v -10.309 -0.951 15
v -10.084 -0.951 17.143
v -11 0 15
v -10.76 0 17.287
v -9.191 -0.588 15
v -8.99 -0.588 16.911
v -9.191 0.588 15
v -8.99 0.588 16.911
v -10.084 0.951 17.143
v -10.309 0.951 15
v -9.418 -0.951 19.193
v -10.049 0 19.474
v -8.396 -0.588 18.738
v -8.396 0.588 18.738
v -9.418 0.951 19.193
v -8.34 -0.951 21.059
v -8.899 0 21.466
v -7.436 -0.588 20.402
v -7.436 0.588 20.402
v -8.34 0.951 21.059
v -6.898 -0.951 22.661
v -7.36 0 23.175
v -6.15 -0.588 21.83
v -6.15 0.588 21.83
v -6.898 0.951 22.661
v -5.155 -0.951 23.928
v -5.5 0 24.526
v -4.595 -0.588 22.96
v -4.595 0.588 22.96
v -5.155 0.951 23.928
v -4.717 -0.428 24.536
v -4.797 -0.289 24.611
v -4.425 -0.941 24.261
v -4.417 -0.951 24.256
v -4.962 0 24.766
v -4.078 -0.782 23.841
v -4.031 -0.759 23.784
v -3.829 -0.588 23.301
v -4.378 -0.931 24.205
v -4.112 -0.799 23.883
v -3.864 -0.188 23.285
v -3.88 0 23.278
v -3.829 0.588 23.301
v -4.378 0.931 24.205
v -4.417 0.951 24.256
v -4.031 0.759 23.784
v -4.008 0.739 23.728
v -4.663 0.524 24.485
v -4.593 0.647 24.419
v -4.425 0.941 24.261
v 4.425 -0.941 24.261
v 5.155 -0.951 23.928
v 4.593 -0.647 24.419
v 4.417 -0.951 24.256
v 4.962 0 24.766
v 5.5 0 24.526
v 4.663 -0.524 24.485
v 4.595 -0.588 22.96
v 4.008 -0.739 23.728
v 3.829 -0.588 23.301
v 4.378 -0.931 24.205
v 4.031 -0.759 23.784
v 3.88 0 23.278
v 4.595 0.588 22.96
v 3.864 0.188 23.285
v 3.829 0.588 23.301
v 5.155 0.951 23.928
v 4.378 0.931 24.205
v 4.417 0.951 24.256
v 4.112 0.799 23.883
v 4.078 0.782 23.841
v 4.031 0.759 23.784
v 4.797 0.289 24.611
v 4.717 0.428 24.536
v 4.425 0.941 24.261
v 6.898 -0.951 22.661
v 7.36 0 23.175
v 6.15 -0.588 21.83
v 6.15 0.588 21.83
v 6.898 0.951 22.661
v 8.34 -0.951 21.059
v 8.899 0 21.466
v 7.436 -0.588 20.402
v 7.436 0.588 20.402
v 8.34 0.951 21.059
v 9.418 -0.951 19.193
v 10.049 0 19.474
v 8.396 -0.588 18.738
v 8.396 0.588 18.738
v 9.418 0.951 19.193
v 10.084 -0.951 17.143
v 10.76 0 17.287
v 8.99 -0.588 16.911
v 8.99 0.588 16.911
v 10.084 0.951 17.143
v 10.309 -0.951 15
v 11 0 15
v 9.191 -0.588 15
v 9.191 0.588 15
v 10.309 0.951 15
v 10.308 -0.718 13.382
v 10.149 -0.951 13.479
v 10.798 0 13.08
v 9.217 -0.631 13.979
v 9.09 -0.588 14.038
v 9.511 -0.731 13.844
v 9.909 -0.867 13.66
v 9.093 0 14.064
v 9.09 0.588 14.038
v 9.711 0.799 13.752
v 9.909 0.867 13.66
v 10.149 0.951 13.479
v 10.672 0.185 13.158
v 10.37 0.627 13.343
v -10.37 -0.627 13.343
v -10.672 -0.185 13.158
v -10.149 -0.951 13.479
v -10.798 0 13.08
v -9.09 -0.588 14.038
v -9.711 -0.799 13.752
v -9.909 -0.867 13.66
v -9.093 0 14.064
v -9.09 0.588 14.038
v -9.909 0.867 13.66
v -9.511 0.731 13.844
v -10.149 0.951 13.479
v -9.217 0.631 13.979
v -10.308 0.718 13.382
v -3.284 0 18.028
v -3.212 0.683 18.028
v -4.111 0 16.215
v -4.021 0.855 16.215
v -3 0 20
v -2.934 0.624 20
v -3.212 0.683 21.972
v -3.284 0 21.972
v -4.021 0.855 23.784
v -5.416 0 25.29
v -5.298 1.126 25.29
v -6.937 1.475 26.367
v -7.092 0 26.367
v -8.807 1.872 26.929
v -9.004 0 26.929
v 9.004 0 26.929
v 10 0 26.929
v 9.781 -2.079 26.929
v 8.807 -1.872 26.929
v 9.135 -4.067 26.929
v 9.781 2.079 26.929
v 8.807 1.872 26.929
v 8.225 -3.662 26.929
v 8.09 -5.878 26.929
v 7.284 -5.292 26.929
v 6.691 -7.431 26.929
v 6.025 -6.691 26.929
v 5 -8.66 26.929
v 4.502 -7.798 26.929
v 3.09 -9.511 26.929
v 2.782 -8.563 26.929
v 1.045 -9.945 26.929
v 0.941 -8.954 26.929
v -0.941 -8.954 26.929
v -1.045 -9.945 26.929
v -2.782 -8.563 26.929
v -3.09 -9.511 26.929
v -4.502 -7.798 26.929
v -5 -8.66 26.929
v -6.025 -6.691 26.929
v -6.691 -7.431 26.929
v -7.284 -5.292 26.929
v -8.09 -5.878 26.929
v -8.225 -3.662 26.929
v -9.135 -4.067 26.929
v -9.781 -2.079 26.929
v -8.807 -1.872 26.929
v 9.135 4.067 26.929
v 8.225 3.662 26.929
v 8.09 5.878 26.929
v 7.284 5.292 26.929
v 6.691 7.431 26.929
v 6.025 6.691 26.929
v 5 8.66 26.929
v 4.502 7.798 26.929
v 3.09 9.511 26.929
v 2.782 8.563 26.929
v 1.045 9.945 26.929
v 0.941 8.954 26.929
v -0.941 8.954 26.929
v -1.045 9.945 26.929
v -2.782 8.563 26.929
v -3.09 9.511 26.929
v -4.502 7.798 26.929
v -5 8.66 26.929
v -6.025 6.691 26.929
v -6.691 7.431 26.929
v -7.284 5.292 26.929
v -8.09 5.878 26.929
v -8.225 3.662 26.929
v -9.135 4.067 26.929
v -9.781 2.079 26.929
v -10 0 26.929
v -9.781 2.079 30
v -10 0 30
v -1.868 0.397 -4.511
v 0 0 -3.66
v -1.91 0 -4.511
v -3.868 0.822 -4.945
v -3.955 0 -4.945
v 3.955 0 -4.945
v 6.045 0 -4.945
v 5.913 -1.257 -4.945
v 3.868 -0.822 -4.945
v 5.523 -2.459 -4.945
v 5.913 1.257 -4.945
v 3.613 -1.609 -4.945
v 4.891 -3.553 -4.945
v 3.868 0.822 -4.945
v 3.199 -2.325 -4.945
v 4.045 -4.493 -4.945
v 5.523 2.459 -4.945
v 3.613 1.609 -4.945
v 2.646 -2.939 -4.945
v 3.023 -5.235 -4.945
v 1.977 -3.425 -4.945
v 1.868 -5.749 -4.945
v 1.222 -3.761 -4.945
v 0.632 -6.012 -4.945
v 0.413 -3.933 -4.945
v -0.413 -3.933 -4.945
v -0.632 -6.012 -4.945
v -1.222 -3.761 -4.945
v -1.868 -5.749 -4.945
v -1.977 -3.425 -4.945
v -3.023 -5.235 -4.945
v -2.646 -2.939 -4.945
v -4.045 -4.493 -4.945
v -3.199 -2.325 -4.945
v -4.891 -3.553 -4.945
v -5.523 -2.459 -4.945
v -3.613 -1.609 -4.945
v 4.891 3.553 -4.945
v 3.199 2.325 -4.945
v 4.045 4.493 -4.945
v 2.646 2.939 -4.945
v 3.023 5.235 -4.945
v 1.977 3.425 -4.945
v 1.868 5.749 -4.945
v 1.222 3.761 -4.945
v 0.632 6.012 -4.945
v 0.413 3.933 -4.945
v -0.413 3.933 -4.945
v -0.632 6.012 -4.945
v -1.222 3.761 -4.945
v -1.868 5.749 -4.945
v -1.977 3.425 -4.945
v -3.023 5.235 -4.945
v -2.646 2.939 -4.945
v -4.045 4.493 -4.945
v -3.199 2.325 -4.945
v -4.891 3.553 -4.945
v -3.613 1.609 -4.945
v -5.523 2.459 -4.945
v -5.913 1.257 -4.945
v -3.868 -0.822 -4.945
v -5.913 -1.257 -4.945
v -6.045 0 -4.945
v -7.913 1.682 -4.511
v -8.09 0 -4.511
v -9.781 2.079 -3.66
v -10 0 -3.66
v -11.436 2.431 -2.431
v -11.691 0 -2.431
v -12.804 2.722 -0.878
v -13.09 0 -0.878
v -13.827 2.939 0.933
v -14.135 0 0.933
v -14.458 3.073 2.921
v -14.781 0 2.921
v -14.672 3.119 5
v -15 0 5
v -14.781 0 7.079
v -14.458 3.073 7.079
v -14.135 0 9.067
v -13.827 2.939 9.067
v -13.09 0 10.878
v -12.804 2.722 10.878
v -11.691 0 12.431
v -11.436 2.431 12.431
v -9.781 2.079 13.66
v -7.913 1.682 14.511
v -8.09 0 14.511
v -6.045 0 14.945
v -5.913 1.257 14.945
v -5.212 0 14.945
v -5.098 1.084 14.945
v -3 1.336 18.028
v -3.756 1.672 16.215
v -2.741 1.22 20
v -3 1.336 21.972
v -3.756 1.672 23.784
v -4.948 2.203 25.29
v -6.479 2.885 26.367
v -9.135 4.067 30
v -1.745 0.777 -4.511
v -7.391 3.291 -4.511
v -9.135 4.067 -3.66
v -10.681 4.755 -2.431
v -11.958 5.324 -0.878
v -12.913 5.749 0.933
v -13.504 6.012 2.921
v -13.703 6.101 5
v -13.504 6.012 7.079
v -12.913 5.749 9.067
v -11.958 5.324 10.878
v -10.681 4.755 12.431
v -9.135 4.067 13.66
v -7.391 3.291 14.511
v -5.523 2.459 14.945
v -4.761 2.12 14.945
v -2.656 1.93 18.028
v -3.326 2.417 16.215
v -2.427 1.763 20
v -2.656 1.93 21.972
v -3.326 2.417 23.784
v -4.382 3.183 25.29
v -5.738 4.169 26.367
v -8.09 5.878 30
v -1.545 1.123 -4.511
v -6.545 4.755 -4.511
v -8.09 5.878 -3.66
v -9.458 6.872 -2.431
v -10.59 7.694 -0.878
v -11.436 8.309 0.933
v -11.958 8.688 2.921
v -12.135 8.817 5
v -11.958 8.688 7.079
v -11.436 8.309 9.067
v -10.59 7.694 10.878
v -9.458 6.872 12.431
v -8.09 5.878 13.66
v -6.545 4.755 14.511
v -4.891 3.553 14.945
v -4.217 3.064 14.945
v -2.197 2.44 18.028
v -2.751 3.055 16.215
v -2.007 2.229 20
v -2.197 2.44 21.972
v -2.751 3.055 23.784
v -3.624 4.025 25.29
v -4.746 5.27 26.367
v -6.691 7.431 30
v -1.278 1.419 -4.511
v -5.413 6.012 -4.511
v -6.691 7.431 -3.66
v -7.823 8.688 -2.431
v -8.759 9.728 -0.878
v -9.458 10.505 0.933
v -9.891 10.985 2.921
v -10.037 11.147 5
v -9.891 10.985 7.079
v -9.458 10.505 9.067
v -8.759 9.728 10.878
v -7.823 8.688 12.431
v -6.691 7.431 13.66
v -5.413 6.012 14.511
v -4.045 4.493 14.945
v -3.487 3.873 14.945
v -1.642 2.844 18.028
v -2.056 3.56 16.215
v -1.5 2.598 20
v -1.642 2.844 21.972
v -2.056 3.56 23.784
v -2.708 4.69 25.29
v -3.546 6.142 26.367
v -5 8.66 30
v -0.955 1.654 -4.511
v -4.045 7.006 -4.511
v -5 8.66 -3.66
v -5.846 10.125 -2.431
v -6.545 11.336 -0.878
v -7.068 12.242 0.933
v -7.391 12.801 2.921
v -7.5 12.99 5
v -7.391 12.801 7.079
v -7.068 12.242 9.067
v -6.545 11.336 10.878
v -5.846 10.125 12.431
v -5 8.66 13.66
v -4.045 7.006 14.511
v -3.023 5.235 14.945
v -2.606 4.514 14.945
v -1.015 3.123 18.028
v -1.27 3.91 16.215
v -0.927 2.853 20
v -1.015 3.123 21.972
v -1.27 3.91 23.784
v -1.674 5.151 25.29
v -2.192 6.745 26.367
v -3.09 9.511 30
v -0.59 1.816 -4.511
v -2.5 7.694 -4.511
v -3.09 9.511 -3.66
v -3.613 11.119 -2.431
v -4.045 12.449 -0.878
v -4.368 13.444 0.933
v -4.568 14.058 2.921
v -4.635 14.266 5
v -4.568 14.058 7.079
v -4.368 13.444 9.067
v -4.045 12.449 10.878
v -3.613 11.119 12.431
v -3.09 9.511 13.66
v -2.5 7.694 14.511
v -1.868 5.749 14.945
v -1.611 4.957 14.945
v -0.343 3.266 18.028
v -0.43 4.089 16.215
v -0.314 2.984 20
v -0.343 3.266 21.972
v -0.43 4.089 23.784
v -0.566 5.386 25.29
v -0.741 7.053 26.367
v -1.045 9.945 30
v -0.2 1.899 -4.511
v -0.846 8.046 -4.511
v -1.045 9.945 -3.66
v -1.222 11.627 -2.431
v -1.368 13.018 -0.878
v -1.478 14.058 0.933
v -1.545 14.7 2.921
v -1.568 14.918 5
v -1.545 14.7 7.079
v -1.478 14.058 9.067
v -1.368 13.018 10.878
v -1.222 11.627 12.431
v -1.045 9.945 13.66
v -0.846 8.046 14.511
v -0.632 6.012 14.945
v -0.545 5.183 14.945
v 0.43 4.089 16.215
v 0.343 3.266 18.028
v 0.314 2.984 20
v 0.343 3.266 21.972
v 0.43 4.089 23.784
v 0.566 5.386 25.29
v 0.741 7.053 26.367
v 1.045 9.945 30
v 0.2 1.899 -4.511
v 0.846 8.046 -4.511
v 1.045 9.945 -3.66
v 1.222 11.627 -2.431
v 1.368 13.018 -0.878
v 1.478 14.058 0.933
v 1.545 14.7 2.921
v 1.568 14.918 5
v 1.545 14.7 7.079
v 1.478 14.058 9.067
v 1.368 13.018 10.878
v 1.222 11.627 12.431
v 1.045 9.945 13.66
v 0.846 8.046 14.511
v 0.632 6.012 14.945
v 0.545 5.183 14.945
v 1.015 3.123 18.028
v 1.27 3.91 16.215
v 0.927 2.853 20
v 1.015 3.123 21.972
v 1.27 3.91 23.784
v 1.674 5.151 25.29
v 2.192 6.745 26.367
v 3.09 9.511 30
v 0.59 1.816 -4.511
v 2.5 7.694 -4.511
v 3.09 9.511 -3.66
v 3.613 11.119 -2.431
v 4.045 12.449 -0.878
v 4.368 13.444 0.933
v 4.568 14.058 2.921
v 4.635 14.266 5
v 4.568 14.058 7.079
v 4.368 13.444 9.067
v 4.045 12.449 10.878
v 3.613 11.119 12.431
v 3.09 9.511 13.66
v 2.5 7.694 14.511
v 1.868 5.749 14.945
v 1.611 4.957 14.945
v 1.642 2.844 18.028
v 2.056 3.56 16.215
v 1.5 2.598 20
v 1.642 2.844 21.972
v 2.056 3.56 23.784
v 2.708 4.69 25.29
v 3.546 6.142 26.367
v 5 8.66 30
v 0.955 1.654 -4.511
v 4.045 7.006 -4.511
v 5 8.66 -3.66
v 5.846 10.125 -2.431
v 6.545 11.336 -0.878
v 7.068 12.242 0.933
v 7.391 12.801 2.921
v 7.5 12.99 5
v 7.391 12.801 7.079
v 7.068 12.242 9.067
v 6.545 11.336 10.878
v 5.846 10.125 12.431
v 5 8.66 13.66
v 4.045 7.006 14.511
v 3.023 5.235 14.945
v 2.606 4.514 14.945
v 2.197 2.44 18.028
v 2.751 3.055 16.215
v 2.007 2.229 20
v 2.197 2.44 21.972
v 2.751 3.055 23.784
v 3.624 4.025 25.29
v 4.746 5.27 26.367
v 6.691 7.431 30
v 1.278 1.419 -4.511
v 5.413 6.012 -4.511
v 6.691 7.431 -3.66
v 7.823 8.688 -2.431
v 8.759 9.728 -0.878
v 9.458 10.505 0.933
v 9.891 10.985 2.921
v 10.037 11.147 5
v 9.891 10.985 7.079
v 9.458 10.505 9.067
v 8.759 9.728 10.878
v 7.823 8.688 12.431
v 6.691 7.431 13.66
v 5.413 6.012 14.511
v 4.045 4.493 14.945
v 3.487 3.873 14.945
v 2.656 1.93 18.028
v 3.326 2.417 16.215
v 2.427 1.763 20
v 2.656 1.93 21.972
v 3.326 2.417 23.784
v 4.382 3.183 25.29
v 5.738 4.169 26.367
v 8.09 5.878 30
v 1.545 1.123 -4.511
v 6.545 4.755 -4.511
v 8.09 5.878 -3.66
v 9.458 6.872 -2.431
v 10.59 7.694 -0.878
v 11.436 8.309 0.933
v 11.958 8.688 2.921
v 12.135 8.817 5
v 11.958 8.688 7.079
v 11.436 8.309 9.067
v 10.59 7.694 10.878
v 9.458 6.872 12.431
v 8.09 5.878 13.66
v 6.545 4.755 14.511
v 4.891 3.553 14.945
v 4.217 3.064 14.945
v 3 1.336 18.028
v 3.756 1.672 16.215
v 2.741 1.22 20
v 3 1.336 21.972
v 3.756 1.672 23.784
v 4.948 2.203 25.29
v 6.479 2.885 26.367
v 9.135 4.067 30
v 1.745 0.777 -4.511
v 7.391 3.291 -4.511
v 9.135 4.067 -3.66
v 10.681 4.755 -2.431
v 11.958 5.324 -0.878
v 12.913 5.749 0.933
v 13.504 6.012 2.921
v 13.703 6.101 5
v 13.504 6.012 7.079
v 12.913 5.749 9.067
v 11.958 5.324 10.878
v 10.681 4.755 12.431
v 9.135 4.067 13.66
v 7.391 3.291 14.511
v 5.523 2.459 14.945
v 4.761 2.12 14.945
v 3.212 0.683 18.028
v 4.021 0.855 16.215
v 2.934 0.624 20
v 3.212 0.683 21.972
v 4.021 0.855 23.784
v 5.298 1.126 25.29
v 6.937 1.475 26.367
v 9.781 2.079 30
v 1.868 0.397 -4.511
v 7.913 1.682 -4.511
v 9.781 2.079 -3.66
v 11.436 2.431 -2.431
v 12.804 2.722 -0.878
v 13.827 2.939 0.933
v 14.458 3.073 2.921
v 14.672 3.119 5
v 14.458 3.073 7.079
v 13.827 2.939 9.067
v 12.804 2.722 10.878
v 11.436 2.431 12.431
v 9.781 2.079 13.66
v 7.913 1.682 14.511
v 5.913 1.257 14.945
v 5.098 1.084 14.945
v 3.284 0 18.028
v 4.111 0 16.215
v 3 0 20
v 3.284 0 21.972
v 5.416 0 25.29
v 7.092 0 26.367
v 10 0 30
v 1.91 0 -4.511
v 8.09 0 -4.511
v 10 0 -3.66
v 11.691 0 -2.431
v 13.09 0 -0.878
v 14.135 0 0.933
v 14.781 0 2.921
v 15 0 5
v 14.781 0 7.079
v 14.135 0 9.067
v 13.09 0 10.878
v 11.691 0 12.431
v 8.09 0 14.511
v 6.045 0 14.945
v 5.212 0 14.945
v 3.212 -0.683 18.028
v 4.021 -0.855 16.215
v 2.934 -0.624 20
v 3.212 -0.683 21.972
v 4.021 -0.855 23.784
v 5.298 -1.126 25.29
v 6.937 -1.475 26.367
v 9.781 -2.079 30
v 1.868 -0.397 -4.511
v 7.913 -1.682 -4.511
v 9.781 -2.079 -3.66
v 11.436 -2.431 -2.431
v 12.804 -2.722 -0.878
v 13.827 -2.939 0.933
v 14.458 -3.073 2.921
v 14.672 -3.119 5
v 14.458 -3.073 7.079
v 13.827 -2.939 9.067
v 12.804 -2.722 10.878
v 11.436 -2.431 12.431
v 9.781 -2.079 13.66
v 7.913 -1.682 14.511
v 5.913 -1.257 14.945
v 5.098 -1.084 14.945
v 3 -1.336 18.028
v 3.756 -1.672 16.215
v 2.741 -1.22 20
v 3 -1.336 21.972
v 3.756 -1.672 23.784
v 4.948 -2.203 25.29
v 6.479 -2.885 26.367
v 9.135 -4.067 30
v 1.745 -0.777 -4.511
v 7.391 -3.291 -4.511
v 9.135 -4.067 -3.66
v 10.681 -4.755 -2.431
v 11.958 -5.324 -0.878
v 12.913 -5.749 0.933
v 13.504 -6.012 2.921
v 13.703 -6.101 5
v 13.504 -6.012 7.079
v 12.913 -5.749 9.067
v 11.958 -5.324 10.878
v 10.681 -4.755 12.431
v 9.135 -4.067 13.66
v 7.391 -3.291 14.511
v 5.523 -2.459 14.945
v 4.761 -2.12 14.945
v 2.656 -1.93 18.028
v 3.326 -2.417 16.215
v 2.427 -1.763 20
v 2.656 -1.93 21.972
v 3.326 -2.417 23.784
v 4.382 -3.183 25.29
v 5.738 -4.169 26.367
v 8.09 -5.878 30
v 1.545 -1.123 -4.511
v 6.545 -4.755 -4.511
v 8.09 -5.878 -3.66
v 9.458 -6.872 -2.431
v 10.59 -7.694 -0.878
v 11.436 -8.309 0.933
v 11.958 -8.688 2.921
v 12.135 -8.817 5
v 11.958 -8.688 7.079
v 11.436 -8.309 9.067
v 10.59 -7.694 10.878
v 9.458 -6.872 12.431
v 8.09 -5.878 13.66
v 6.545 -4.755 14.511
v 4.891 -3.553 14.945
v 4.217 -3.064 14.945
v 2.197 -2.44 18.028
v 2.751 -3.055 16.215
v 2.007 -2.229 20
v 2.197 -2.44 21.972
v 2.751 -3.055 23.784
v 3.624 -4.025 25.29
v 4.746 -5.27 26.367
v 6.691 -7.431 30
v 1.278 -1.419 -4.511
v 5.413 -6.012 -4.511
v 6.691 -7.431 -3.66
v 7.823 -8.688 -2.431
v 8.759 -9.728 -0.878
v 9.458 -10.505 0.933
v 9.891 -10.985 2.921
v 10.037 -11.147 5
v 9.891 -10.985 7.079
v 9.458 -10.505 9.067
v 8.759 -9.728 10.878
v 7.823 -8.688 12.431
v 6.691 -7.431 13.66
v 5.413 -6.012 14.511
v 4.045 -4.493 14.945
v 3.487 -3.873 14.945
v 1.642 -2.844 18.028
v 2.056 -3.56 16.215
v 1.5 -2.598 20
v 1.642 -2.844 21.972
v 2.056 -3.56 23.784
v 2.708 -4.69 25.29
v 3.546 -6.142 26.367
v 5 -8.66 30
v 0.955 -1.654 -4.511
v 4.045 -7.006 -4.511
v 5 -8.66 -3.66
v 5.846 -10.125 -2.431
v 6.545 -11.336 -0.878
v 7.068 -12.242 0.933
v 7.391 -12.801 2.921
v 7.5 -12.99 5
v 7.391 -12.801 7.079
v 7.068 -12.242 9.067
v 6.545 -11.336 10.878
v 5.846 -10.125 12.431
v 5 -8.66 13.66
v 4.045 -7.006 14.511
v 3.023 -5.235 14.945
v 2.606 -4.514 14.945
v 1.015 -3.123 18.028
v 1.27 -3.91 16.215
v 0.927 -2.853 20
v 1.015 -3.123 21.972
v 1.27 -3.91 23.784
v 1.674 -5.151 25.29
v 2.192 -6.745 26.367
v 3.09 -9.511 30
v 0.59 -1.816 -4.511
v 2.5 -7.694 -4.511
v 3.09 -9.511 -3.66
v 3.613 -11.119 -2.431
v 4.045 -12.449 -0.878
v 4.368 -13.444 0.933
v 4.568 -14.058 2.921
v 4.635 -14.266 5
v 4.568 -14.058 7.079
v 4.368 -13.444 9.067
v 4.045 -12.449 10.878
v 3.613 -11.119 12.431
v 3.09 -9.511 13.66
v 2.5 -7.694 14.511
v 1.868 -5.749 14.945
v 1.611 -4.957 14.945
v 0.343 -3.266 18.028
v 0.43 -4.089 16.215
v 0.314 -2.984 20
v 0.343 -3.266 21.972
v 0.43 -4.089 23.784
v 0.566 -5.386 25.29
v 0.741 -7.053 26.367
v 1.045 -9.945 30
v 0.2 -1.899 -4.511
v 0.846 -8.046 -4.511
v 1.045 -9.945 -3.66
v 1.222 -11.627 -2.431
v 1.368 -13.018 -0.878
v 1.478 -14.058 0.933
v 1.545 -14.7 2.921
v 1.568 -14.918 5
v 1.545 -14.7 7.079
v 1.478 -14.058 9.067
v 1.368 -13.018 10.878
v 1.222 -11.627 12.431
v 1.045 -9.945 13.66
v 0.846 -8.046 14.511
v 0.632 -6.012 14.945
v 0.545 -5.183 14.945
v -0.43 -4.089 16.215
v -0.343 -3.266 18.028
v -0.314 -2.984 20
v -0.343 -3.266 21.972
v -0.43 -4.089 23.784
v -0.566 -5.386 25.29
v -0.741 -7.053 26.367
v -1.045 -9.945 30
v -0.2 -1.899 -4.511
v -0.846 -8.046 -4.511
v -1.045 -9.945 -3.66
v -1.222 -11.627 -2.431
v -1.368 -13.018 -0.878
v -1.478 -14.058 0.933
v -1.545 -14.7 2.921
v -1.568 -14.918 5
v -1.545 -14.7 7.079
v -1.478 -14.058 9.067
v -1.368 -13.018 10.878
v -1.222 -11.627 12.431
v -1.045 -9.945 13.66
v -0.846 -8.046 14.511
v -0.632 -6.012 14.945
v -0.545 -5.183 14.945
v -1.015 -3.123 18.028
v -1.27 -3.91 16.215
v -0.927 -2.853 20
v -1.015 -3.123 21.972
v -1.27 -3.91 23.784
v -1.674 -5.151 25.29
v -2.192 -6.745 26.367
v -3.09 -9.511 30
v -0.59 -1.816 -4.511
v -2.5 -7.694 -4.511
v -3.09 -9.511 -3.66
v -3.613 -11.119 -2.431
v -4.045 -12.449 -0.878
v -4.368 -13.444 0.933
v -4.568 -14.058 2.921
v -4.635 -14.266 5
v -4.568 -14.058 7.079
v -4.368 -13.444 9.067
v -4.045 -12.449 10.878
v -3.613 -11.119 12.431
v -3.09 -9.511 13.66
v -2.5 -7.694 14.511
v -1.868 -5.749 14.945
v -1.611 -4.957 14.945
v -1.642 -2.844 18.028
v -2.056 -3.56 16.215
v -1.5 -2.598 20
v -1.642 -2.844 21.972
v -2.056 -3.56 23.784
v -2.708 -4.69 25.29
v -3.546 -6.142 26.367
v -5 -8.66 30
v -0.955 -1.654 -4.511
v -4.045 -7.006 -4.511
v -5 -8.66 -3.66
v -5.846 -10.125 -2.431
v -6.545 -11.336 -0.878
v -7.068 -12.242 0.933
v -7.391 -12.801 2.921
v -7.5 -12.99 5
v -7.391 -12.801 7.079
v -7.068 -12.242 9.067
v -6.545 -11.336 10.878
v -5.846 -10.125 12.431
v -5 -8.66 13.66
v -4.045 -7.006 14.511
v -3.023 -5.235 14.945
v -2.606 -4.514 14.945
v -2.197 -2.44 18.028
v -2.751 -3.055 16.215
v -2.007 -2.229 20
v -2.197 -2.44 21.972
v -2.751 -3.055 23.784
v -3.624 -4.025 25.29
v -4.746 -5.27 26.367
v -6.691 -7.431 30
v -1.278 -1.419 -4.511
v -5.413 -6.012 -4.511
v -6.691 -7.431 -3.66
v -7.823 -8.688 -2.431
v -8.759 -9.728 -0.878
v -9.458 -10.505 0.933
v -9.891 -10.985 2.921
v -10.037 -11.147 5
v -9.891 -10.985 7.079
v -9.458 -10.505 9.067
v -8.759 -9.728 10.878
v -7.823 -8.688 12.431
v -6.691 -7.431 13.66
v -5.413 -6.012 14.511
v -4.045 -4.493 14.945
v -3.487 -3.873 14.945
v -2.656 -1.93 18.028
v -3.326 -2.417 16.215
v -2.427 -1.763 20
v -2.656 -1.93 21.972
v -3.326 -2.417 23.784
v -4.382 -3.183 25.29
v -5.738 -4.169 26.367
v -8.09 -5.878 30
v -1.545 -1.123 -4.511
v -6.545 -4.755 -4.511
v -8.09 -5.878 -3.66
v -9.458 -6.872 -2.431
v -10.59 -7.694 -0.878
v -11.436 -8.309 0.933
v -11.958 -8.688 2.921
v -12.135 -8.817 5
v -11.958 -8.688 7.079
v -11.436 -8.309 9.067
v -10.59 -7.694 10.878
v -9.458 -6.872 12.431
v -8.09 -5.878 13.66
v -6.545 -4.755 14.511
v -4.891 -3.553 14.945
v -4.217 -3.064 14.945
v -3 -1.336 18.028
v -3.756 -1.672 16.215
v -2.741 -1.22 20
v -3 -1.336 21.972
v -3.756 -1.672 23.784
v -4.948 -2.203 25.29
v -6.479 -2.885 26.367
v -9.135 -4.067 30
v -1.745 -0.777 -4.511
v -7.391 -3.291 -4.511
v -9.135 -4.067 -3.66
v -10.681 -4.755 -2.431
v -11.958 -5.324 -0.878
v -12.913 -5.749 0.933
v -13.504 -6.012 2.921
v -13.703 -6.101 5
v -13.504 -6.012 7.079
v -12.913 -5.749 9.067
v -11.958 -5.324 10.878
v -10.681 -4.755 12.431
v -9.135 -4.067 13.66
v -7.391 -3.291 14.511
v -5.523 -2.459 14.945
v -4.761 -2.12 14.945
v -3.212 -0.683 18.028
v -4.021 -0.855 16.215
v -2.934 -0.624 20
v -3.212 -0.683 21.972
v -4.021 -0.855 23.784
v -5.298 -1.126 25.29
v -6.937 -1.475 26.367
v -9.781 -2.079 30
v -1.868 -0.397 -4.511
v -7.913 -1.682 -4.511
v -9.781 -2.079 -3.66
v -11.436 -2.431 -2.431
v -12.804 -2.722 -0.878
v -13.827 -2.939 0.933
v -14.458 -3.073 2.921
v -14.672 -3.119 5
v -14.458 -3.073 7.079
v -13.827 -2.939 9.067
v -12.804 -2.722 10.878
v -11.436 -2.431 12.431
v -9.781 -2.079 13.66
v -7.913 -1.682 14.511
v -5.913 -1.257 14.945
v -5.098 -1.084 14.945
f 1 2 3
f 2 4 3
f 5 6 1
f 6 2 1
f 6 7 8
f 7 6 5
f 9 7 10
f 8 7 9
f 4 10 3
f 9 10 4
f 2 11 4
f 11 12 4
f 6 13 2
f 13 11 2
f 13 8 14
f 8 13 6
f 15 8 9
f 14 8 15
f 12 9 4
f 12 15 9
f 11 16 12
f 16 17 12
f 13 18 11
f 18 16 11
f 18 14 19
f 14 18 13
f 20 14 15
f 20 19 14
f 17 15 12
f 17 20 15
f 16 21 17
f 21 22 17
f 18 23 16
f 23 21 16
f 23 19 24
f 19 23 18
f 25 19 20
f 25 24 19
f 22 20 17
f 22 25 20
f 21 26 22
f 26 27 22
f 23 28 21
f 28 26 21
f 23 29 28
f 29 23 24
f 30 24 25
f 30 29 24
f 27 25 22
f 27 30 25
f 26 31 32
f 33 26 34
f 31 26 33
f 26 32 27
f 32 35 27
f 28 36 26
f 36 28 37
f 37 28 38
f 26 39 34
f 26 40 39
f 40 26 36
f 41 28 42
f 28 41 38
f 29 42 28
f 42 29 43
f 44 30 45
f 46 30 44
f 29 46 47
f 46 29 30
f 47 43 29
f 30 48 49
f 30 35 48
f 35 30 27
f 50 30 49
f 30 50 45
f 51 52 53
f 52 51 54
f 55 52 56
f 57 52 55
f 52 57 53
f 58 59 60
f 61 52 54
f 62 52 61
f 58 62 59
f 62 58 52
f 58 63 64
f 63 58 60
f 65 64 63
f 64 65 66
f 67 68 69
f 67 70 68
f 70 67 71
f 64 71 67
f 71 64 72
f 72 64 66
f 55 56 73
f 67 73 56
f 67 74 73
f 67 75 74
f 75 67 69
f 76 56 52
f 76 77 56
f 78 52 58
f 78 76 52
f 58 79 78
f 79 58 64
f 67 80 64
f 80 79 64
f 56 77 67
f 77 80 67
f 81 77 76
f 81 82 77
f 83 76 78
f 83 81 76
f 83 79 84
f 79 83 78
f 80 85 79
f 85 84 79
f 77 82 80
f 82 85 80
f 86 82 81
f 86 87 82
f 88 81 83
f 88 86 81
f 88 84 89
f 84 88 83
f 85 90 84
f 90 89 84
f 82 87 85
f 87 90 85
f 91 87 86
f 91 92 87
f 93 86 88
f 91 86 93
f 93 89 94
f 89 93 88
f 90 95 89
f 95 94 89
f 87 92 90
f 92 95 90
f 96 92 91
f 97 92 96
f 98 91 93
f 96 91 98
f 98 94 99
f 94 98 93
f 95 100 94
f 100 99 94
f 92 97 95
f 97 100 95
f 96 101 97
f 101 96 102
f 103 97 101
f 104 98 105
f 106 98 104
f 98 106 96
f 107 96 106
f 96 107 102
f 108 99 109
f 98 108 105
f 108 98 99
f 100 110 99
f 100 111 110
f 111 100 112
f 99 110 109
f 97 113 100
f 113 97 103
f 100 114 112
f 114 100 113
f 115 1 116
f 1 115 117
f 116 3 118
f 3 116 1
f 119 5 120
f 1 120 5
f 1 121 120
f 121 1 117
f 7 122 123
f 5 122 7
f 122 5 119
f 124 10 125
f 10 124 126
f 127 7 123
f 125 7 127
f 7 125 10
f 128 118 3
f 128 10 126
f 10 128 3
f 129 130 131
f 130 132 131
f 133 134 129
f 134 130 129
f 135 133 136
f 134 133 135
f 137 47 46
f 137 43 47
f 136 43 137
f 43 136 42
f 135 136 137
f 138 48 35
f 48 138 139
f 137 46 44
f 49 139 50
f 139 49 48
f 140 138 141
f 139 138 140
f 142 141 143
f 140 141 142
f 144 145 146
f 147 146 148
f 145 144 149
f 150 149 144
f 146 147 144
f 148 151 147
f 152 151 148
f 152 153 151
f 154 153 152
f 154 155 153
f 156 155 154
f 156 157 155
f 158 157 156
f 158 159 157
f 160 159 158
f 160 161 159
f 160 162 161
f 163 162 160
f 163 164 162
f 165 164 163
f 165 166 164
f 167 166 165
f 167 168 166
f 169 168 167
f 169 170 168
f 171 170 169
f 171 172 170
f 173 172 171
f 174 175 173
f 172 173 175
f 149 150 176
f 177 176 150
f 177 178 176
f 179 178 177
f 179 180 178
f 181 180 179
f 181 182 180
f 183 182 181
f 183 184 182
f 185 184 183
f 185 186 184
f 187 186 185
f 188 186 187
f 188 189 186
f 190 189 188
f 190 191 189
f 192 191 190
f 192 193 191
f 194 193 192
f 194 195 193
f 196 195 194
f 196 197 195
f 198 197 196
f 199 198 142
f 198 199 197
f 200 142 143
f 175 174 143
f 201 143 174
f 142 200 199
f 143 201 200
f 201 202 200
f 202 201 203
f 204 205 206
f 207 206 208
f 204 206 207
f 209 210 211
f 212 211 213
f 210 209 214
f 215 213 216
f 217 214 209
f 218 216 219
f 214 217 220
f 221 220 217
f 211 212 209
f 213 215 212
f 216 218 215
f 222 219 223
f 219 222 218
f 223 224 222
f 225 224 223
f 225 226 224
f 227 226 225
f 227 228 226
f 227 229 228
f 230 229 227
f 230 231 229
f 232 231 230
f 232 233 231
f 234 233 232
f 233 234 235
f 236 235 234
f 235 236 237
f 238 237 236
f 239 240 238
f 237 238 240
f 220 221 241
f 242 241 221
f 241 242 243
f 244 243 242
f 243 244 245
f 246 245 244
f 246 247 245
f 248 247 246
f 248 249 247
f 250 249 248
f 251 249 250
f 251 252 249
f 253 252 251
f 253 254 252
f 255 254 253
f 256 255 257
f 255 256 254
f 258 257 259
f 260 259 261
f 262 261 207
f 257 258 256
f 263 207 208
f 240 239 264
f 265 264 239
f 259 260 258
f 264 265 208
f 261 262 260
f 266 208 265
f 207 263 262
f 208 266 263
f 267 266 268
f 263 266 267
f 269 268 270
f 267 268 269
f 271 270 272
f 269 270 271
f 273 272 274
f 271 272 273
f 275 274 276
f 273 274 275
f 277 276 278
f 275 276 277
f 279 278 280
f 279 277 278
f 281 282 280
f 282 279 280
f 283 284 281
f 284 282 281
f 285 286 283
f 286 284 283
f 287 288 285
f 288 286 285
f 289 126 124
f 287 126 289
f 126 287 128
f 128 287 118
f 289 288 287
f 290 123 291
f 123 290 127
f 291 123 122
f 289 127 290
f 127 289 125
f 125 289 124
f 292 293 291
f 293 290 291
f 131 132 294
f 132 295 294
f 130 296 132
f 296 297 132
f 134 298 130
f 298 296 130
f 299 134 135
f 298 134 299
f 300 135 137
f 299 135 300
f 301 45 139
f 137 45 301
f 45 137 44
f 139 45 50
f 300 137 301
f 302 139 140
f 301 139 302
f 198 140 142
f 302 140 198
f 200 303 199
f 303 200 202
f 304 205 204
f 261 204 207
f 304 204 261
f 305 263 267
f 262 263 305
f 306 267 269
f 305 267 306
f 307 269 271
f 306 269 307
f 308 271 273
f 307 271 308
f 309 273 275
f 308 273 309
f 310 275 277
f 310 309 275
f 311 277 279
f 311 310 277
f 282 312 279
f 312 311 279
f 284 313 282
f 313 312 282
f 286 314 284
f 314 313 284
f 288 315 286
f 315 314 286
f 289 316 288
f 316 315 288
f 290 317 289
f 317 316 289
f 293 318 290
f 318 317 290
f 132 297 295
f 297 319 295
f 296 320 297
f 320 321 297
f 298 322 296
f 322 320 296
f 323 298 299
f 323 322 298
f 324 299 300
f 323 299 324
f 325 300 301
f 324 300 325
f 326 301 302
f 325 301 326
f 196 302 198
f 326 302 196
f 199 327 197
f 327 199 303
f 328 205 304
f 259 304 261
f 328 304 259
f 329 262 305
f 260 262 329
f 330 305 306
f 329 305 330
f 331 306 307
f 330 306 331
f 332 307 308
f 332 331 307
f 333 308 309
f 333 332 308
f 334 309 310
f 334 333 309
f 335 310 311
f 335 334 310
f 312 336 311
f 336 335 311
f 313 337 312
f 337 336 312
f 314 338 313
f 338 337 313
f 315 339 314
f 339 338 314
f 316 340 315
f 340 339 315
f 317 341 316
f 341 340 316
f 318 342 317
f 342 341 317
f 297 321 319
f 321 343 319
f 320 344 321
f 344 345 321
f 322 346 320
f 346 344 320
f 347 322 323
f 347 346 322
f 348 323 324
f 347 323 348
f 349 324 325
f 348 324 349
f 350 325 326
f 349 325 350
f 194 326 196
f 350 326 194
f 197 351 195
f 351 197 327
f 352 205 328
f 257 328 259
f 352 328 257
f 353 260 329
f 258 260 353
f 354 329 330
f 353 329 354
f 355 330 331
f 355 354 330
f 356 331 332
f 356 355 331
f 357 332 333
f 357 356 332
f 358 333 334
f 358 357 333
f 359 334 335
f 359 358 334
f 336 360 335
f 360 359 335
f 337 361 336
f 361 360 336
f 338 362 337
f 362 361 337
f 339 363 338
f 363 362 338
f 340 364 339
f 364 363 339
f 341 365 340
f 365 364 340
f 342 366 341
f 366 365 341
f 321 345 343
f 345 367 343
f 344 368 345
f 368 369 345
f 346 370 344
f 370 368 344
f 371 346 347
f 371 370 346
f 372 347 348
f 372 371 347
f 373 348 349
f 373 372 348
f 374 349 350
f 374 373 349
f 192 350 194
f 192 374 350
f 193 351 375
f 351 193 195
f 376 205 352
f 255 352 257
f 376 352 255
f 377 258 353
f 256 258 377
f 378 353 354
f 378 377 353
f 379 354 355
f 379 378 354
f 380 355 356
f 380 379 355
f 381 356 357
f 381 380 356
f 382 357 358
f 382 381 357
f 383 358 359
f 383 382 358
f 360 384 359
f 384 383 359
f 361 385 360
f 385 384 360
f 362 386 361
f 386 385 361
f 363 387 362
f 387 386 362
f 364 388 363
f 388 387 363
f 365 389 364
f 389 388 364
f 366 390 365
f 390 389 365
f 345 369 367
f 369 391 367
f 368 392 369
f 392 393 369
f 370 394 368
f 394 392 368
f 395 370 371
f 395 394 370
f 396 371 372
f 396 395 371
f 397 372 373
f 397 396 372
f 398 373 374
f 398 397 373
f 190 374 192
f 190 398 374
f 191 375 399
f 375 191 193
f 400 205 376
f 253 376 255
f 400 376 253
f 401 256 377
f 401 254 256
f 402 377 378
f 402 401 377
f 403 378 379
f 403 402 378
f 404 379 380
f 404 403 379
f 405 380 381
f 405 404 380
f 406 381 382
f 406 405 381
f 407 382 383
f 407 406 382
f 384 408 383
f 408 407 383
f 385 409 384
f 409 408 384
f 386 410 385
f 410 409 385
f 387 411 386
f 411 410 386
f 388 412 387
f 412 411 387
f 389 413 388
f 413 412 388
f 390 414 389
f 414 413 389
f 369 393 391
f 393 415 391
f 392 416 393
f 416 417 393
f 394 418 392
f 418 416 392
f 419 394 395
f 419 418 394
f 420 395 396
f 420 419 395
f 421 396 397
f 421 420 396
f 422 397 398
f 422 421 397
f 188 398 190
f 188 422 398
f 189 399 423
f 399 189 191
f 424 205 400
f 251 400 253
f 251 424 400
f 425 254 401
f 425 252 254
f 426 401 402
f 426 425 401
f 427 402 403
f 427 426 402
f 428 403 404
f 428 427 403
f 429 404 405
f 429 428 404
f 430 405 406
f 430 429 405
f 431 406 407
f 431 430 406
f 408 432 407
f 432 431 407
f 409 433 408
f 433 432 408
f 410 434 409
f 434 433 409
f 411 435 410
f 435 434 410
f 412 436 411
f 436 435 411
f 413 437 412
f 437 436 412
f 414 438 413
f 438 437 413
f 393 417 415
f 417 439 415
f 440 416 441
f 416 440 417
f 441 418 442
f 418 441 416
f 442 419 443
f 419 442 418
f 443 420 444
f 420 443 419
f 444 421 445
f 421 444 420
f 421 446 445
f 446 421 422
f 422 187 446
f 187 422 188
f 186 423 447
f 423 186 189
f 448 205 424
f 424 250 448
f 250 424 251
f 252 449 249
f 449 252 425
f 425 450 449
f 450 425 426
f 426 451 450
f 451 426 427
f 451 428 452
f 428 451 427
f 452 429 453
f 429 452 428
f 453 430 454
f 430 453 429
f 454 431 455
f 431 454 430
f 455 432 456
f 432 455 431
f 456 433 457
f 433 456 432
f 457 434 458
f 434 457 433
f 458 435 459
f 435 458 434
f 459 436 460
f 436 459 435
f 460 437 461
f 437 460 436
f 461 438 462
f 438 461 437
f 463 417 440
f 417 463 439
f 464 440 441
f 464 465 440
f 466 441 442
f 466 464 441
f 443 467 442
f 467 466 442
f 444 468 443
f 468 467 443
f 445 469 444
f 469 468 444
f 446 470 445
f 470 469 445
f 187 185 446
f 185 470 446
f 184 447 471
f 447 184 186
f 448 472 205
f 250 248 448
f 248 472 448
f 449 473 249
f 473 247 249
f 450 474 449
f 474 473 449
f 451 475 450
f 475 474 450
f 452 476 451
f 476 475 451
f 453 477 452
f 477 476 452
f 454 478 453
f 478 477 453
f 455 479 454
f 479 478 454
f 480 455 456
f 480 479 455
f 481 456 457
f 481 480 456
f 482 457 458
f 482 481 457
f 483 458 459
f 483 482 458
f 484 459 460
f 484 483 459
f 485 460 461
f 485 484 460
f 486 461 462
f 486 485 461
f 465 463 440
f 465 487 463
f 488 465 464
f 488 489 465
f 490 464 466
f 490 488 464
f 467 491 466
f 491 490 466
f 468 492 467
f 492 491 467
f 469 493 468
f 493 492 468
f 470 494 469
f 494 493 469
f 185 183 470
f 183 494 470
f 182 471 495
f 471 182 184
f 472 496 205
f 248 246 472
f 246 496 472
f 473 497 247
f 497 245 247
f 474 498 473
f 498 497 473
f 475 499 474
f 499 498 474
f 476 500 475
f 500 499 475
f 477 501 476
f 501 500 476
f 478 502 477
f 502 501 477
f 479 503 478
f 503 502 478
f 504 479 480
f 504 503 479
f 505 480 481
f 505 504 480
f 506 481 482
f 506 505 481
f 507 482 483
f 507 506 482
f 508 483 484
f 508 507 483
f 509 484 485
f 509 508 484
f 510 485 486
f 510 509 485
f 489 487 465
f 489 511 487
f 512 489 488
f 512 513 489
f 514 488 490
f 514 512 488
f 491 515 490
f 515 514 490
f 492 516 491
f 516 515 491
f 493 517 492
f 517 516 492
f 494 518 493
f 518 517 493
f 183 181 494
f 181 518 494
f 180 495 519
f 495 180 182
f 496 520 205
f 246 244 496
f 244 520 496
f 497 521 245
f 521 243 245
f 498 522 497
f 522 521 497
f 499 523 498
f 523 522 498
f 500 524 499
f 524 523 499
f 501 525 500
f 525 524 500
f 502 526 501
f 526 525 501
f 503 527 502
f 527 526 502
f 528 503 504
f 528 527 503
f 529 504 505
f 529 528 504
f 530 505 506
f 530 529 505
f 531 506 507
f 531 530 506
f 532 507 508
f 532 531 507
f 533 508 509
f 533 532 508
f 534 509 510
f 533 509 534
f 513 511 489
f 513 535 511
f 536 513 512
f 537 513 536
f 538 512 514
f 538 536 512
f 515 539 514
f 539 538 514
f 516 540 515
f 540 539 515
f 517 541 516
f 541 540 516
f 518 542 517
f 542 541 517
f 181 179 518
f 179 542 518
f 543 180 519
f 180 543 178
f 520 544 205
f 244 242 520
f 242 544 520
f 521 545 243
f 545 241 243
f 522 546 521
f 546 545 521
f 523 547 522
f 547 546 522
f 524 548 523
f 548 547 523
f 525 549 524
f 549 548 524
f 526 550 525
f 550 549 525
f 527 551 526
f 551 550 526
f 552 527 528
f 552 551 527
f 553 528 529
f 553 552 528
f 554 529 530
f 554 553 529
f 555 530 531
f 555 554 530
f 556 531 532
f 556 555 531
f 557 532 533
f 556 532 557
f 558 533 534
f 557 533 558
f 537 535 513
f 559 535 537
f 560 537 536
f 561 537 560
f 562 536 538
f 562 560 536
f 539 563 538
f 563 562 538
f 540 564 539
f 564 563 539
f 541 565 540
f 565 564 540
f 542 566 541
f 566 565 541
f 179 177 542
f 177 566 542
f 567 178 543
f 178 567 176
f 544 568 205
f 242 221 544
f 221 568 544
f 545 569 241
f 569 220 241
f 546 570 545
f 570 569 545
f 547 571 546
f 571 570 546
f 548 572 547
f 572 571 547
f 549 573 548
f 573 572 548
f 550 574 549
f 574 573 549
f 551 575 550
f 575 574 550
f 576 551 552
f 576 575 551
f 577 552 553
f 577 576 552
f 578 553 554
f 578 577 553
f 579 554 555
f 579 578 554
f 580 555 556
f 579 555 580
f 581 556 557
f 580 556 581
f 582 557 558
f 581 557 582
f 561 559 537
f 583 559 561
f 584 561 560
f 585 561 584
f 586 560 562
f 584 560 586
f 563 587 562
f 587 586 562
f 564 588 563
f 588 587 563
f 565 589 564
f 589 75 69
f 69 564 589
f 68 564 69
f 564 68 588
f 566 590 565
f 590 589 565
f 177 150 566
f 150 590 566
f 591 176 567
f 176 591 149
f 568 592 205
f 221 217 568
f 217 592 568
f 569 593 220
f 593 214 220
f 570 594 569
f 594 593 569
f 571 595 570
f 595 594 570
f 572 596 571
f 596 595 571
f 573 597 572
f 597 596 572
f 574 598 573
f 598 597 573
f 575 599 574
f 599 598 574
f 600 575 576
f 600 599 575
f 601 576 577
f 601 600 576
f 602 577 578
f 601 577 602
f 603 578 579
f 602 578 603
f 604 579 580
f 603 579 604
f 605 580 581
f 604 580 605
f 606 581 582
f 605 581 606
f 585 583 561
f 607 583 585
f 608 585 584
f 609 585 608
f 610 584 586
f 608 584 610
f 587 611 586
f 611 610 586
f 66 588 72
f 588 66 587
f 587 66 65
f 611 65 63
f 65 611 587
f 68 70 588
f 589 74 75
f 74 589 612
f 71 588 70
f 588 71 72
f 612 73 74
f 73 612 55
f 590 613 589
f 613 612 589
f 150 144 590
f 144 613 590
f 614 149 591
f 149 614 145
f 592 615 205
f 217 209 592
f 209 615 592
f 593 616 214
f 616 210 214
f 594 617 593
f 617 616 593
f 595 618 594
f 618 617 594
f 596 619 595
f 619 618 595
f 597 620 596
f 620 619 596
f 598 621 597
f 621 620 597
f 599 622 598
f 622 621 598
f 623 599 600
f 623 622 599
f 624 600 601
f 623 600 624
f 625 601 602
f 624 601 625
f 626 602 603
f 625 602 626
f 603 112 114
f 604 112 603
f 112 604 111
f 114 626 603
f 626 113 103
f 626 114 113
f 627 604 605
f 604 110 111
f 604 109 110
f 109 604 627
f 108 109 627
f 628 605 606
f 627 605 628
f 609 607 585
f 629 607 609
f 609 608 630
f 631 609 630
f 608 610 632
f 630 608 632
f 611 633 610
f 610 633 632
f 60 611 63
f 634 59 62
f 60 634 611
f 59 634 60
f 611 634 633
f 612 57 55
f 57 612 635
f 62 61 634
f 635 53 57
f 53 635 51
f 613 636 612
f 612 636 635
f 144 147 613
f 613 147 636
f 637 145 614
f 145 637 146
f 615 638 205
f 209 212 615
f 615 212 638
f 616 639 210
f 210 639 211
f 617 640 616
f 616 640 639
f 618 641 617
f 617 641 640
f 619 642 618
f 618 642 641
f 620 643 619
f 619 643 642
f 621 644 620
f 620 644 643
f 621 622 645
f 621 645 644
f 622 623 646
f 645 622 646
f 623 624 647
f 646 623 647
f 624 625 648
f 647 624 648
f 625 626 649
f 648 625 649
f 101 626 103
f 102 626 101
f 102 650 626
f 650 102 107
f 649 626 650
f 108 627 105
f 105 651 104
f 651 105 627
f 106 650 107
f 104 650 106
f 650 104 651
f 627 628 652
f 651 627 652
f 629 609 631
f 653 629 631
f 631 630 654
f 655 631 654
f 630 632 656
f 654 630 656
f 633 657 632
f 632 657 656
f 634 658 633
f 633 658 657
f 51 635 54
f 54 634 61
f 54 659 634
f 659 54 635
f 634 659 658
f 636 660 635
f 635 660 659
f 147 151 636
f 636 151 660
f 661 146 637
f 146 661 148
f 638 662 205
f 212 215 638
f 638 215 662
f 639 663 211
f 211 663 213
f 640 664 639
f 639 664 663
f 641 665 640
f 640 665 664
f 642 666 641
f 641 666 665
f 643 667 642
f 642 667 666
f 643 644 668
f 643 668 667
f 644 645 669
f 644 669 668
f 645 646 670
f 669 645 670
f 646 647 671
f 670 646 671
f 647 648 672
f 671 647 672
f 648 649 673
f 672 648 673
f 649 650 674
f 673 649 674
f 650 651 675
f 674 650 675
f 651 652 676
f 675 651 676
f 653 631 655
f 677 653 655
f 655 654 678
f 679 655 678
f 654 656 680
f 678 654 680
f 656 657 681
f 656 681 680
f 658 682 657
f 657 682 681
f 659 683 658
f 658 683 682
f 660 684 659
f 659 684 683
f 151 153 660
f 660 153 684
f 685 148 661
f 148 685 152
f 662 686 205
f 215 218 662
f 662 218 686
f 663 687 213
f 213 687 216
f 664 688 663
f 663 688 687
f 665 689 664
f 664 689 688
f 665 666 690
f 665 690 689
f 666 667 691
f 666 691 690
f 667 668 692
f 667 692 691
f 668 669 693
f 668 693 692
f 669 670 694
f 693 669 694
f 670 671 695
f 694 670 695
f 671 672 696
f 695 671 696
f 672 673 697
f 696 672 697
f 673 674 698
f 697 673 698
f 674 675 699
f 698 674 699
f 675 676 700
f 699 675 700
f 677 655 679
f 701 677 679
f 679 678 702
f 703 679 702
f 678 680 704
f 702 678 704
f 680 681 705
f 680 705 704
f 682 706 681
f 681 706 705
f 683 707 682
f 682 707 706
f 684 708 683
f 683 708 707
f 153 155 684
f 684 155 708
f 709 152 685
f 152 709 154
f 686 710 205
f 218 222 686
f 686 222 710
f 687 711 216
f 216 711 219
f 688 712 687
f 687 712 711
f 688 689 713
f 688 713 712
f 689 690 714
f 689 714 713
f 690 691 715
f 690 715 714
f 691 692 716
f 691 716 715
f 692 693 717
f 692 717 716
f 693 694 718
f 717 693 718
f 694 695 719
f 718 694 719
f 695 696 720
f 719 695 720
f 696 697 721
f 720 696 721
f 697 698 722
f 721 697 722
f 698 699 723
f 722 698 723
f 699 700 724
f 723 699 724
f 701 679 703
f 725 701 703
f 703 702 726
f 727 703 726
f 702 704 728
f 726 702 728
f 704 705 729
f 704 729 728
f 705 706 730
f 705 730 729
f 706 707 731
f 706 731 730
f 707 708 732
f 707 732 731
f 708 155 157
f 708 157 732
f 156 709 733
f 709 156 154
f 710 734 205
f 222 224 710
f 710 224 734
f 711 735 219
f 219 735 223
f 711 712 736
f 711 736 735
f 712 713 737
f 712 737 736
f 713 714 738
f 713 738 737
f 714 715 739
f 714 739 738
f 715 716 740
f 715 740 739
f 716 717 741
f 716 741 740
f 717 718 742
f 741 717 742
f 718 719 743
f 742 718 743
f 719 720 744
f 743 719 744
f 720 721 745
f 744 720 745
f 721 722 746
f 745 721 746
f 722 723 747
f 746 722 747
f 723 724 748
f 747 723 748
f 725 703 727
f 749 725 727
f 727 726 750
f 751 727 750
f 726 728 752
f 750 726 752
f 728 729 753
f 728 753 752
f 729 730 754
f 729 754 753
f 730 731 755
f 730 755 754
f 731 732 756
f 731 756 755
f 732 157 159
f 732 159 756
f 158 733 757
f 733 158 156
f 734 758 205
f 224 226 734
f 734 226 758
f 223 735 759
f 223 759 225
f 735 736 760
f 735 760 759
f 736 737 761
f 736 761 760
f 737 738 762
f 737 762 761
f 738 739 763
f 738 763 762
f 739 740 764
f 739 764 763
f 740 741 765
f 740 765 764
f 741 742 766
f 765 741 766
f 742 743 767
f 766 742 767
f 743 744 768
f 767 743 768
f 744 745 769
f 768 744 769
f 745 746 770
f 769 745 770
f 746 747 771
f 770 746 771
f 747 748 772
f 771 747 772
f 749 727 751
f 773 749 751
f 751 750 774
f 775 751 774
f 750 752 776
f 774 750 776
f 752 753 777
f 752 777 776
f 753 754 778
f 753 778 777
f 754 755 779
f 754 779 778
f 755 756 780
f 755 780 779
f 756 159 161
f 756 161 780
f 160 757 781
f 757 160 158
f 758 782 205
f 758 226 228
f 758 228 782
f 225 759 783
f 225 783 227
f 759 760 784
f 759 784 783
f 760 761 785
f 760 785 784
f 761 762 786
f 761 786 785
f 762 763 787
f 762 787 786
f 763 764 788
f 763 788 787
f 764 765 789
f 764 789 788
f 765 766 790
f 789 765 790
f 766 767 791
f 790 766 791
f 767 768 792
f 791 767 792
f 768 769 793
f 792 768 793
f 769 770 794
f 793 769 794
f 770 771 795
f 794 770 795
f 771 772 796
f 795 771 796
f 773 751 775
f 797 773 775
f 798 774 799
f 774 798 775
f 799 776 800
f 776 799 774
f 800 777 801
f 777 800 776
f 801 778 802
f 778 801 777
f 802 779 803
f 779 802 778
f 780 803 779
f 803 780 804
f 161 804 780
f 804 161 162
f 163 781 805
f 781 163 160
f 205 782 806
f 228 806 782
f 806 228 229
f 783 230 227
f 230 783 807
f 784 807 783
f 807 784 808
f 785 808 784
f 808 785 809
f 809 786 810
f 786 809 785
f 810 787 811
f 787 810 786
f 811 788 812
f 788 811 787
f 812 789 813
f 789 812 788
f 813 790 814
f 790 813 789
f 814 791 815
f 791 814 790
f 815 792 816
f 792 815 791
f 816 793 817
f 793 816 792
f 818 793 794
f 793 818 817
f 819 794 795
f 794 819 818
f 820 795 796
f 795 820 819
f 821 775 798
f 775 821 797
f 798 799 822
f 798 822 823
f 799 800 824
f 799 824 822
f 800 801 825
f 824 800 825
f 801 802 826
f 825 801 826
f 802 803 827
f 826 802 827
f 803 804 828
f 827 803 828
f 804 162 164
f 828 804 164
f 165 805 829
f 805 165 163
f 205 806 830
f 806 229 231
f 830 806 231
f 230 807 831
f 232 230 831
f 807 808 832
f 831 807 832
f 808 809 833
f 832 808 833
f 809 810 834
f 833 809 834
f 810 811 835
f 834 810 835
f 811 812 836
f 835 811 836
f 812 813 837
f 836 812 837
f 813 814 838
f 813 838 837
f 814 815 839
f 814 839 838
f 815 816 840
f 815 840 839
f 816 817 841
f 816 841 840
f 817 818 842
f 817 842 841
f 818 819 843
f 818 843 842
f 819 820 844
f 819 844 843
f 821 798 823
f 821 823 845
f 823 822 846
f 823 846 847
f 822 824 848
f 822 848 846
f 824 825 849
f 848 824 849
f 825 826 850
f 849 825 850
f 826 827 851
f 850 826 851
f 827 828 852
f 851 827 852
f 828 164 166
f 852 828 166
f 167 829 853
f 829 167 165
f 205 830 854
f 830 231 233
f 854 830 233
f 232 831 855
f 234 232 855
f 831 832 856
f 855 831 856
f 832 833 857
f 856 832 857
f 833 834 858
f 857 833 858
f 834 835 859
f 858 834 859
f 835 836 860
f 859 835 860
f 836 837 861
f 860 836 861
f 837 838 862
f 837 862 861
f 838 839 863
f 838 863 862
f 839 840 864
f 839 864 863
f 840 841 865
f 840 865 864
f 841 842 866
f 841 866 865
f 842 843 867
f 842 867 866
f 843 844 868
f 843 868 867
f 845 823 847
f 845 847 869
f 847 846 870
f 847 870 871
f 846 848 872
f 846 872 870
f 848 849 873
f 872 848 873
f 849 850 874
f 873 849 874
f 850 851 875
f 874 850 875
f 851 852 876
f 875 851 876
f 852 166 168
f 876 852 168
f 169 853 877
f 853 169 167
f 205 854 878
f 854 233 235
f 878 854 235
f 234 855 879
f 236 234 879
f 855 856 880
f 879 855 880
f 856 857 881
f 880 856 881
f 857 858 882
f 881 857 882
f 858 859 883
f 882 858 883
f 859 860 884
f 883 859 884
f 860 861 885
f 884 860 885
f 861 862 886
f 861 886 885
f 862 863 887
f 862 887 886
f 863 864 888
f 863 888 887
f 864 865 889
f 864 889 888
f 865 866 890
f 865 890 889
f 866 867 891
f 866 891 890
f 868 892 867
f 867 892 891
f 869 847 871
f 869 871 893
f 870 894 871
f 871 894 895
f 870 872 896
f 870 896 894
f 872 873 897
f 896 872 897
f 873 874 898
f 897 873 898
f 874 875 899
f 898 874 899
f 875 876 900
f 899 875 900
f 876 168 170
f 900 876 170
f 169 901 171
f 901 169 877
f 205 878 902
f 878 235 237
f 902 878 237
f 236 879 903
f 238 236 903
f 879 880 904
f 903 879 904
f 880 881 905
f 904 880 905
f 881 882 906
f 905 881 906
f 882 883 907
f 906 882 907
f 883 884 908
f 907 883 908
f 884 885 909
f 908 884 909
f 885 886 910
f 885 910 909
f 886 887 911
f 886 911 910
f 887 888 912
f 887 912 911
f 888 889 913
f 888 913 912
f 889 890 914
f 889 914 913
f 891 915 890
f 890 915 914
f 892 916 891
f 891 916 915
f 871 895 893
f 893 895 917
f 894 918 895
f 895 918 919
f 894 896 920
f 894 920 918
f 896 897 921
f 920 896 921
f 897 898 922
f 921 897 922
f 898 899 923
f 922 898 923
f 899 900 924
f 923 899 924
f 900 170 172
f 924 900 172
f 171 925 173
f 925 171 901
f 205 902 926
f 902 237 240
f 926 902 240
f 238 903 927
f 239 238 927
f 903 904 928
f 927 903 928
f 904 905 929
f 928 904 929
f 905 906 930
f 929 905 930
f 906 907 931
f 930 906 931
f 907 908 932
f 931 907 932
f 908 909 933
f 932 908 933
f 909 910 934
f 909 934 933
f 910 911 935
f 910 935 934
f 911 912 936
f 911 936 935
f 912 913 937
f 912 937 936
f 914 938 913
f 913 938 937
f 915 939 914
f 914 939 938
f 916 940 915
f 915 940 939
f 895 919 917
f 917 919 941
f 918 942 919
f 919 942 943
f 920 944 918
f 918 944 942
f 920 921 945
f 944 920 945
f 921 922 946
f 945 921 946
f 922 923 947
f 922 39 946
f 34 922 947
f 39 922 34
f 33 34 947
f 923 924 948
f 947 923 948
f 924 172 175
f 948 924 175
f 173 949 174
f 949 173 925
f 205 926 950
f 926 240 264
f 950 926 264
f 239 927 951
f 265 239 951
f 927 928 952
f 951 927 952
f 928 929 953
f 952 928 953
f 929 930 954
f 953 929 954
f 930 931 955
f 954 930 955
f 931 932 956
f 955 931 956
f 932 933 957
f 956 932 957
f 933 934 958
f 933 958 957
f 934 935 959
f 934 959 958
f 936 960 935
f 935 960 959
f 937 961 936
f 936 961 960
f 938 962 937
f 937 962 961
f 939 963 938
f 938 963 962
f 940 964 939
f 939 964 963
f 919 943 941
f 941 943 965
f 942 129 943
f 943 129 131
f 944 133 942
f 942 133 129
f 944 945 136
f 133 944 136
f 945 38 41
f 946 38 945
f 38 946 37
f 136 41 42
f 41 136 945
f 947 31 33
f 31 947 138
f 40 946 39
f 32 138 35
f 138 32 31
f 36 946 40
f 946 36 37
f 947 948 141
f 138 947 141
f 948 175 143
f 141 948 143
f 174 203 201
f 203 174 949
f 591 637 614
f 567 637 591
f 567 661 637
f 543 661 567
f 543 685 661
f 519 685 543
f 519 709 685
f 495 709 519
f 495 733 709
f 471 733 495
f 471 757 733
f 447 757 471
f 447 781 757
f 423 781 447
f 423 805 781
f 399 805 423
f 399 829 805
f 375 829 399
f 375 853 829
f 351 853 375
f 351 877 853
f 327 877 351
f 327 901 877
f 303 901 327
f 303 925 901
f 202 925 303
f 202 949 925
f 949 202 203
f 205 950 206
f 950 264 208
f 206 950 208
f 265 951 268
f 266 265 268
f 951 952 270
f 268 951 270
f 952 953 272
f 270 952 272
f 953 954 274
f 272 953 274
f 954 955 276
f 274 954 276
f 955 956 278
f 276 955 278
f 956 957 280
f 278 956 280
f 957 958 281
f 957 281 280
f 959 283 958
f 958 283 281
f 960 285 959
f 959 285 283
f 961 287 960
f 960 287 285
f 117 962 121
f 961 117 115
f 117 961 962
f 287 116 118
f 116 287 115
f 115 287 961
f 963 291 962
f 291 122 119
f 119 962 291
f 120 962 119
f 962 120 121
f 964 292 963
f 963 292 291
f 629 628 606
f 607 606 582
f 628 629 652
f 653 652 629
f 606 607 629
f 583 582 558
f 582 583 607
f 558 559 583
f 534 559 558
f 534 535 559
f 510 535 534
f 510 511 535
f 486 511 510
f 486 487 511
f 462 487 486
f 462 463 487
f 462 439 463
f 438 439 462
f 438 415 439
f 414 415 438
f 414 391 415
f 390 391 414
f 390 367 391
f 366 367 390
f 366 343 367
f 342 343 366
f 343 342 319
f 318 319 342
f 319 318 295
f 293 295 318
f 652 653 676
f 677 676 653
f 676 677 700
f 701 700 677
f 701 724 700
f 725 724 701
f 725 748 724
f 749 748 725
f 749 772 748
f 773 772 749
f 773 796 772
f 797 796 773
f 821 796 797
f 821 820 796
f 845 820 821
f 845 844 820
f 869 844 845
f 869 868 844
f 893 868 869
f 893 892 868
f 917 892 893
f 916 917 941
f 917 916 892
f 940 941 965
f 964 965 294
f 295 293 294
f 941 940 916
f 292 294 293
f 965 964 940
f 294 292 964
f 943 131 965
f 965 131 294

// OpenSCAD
// preview[view:south, tilt:side]


/*
*
*	Creator: Meiying Cheung
*	MCP-lab: http://hci.rwth-aachen.de/mcp
*	It draws a Vase
*
*/

/* [Parameters] */
//it changes the radio of the lower part:   
radio_body = 0;//[0:5]
//resize the hole figure but it may deform it:   
resize = 10;//[5.1:18.1]
//it changes the thick of the Vase:  
neck = 0;//[0:1]

/* [Hidden] */
union(){

	//handlers
	translate([0,0,15])rotate([90,0,0])rotate_extrude(convexity = 10)
	translate([resize, 0, 0])
	circle(r = 1);
	//

	//main body
	rotate_extrude(convexity = 10)
	union(){
		union()
		{
			difference()
			{
				difference()
				{
					square([resize,resize+resize*2]);
					translate([resize,resize*2,0])circle(r=resize*0.7-neck);
				}

				translate([5,5,0])
				circle(r=resize+radio_body);
			}
			intersection(){
			translate([5,5,0])
			circle(r=resize+radio_body);
			translate([0,-5,0])square([2*resize+radio_body,2*resize+radio_body]);
			}
		}	

	}

}
